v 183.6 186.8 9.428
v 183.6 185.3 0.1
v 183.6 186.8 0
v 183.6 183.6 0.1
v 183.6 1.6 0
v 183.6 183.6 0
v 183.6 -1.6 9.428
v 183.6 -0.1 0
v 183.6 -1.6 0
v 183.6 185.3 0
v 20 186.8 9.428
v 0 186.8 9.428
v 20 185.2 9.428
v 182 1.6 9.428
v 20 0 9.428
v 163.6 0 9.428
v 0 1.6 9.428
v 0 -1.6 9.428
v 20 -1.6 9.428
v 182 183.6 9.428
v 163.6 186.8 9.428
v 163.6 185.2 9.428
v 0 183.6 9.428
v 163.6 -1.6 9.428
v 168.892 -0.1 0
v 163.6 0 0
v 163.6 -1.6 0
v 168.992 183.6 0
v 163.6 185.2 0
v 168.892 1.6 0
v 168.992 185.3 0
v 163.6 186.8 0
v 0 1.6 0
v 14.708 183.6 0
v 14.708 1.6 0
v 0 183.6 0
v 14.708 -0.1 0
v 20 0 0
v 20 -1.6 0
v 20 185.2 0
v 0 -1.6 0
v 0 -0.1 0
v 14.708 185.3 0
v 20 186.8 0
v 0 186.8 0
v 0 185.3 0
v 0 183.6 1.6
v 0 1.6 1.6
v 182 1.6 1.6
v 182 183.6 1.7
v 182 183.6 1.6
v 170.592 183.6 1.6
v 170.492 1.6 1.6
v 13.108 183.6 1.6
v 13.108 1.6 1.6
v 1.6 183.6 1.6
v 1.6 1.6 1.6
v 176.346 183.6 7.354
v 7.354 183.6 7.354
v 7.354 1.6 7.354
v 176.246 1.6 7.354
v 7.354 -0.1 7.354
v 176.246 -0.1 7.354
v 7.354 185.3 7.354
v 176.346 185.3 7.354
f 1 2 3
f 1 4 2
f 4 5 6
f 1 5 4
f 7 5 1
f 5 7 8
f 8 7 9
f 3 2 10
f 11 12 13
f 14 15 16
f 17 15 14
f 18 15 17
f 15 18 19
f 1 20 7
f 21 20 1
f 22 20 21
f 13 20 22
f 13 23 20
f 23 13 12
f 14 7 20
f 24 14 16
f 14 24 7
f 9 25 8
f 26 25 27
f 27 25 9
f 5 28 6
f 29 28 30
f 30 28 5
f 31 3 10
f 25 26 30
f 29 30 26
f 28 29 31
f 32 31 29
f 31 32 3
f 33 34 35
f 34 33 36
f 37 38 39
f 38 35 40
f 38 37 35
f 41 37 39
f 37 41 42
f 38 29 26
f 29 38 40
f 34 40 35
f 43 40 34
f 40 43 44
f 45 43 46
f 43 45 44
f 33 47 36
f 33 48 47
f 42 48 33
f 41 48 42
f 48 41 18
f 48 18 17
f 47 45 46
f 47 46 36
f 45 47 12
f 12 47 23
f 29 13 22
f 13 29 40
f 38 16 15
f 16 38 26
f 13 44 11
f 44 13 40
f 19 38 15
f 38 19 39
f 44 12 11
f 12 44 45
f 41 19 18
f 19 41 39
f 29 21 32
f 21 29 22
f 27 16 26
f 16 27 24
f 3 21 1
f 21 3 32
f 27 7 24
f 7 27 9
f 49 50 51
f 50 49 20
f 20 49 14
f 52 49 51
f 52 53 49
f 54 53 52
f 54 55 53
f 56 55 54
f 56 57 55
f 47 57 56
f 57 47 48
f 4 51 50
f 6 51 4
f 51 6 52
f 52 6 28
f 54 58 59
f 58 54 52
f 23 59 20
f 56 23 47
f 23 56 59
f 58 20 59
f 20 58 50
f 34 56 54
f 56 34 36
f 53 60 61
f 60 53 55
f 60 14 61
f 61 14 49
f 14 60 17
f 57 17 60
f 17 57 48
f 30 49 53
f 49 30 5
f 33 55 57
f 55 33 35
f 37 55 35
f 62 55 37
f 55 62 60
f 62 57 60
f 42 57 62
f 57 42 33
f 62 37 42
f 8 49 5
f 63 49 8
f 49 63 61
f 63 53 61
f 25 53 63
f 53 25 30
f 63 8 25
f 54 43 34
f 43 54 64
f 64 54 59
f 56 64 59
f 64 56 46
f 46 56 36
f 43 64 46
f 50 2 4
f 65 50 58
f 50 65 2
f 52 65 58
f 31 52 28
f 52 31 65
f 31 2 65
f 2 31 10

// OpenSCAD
$fa=4; // default minimum facet angle is now 0.5
$fs=0.05; // default minimum facet size is now 0.05 mm

tolerance = .2;
unit = 20;
wallThickness = 1.6;
drawerWallThickness = .8;
barWidth = 10;

internalHeight = diag(barWidth, barWidth) / 3 * 2 - (2*wallThickness);

handleHeight = 5;

xUnits = 9;
yUnits = 9;

interiorXDimension = tol(xUnits * unit + drawerWallThickness * 2, -2);
interiorYDimension = tol(yUnits * unit + drawerWallThickness * 2, -2);

exteriorXDimension = interiorXDimension + wallThickness;
exteriorYDimension = interiorYDimension + wallThickness * 2;

union() {
  difference() {
    union() {
      cube([exteriorXDimension, exteriorYDimension, internalHeight + 2 * wallThickness]);
      translate([0, -wallThickness, 0]) cube([barWidth * 2, exteriorYDimension + 2 * wallThickness, diag(barWidth, barWidth) / 3 * 2]);
      translate([exteriorXDimension - barWidth * 2, -wallThickness, 0]) cube([barWidth * 2, exteriorYDimension + 2 * wallThickness, diag(barWidth, barWidth) / 3 * 2]);
    }
    translate([-.1, wallThickness, wallThickness]) cube([interiorXDimension + .1, interiorYDimension, internalHeight + 2 * wallThickness]);

    translate([0, -.1, 0]) rotate([0, 45, 0]) cube([tol(barWidth, -2), wallThickness + .1, tol(barWidth, -2)]);
    translate([exteriorXDimension - diag(tol(barWidth, -2), tol(barWidth, -2)), -.1, 0]) rotate([0, 45, 0]) cube([tol(barWidth, -2), wallThickness + .1, tol(barWidth, -2)]);
    translate([0, exteriorYDimension - wallThickness, 0]) rotate([0, 45, 0]) cube([tol(barWidth, -2), wallThickness + .1, tol(barWidth, -2)]);
    translate([exteriorXDimension - diag(tol(barWidth, -2), tol(barWidth, -2)) + .1, exteriorYDimension - wallThickness, 0]) rotate([0, 45, 0]) cube([tol(barWidth, -2), wallThickness + .1, tol(barWidth, -2)]);
  }
}


function tol(value, m = 1) = value - (m * tolerance);

function diag(x, y) = sqrt(x * x + y * y);
